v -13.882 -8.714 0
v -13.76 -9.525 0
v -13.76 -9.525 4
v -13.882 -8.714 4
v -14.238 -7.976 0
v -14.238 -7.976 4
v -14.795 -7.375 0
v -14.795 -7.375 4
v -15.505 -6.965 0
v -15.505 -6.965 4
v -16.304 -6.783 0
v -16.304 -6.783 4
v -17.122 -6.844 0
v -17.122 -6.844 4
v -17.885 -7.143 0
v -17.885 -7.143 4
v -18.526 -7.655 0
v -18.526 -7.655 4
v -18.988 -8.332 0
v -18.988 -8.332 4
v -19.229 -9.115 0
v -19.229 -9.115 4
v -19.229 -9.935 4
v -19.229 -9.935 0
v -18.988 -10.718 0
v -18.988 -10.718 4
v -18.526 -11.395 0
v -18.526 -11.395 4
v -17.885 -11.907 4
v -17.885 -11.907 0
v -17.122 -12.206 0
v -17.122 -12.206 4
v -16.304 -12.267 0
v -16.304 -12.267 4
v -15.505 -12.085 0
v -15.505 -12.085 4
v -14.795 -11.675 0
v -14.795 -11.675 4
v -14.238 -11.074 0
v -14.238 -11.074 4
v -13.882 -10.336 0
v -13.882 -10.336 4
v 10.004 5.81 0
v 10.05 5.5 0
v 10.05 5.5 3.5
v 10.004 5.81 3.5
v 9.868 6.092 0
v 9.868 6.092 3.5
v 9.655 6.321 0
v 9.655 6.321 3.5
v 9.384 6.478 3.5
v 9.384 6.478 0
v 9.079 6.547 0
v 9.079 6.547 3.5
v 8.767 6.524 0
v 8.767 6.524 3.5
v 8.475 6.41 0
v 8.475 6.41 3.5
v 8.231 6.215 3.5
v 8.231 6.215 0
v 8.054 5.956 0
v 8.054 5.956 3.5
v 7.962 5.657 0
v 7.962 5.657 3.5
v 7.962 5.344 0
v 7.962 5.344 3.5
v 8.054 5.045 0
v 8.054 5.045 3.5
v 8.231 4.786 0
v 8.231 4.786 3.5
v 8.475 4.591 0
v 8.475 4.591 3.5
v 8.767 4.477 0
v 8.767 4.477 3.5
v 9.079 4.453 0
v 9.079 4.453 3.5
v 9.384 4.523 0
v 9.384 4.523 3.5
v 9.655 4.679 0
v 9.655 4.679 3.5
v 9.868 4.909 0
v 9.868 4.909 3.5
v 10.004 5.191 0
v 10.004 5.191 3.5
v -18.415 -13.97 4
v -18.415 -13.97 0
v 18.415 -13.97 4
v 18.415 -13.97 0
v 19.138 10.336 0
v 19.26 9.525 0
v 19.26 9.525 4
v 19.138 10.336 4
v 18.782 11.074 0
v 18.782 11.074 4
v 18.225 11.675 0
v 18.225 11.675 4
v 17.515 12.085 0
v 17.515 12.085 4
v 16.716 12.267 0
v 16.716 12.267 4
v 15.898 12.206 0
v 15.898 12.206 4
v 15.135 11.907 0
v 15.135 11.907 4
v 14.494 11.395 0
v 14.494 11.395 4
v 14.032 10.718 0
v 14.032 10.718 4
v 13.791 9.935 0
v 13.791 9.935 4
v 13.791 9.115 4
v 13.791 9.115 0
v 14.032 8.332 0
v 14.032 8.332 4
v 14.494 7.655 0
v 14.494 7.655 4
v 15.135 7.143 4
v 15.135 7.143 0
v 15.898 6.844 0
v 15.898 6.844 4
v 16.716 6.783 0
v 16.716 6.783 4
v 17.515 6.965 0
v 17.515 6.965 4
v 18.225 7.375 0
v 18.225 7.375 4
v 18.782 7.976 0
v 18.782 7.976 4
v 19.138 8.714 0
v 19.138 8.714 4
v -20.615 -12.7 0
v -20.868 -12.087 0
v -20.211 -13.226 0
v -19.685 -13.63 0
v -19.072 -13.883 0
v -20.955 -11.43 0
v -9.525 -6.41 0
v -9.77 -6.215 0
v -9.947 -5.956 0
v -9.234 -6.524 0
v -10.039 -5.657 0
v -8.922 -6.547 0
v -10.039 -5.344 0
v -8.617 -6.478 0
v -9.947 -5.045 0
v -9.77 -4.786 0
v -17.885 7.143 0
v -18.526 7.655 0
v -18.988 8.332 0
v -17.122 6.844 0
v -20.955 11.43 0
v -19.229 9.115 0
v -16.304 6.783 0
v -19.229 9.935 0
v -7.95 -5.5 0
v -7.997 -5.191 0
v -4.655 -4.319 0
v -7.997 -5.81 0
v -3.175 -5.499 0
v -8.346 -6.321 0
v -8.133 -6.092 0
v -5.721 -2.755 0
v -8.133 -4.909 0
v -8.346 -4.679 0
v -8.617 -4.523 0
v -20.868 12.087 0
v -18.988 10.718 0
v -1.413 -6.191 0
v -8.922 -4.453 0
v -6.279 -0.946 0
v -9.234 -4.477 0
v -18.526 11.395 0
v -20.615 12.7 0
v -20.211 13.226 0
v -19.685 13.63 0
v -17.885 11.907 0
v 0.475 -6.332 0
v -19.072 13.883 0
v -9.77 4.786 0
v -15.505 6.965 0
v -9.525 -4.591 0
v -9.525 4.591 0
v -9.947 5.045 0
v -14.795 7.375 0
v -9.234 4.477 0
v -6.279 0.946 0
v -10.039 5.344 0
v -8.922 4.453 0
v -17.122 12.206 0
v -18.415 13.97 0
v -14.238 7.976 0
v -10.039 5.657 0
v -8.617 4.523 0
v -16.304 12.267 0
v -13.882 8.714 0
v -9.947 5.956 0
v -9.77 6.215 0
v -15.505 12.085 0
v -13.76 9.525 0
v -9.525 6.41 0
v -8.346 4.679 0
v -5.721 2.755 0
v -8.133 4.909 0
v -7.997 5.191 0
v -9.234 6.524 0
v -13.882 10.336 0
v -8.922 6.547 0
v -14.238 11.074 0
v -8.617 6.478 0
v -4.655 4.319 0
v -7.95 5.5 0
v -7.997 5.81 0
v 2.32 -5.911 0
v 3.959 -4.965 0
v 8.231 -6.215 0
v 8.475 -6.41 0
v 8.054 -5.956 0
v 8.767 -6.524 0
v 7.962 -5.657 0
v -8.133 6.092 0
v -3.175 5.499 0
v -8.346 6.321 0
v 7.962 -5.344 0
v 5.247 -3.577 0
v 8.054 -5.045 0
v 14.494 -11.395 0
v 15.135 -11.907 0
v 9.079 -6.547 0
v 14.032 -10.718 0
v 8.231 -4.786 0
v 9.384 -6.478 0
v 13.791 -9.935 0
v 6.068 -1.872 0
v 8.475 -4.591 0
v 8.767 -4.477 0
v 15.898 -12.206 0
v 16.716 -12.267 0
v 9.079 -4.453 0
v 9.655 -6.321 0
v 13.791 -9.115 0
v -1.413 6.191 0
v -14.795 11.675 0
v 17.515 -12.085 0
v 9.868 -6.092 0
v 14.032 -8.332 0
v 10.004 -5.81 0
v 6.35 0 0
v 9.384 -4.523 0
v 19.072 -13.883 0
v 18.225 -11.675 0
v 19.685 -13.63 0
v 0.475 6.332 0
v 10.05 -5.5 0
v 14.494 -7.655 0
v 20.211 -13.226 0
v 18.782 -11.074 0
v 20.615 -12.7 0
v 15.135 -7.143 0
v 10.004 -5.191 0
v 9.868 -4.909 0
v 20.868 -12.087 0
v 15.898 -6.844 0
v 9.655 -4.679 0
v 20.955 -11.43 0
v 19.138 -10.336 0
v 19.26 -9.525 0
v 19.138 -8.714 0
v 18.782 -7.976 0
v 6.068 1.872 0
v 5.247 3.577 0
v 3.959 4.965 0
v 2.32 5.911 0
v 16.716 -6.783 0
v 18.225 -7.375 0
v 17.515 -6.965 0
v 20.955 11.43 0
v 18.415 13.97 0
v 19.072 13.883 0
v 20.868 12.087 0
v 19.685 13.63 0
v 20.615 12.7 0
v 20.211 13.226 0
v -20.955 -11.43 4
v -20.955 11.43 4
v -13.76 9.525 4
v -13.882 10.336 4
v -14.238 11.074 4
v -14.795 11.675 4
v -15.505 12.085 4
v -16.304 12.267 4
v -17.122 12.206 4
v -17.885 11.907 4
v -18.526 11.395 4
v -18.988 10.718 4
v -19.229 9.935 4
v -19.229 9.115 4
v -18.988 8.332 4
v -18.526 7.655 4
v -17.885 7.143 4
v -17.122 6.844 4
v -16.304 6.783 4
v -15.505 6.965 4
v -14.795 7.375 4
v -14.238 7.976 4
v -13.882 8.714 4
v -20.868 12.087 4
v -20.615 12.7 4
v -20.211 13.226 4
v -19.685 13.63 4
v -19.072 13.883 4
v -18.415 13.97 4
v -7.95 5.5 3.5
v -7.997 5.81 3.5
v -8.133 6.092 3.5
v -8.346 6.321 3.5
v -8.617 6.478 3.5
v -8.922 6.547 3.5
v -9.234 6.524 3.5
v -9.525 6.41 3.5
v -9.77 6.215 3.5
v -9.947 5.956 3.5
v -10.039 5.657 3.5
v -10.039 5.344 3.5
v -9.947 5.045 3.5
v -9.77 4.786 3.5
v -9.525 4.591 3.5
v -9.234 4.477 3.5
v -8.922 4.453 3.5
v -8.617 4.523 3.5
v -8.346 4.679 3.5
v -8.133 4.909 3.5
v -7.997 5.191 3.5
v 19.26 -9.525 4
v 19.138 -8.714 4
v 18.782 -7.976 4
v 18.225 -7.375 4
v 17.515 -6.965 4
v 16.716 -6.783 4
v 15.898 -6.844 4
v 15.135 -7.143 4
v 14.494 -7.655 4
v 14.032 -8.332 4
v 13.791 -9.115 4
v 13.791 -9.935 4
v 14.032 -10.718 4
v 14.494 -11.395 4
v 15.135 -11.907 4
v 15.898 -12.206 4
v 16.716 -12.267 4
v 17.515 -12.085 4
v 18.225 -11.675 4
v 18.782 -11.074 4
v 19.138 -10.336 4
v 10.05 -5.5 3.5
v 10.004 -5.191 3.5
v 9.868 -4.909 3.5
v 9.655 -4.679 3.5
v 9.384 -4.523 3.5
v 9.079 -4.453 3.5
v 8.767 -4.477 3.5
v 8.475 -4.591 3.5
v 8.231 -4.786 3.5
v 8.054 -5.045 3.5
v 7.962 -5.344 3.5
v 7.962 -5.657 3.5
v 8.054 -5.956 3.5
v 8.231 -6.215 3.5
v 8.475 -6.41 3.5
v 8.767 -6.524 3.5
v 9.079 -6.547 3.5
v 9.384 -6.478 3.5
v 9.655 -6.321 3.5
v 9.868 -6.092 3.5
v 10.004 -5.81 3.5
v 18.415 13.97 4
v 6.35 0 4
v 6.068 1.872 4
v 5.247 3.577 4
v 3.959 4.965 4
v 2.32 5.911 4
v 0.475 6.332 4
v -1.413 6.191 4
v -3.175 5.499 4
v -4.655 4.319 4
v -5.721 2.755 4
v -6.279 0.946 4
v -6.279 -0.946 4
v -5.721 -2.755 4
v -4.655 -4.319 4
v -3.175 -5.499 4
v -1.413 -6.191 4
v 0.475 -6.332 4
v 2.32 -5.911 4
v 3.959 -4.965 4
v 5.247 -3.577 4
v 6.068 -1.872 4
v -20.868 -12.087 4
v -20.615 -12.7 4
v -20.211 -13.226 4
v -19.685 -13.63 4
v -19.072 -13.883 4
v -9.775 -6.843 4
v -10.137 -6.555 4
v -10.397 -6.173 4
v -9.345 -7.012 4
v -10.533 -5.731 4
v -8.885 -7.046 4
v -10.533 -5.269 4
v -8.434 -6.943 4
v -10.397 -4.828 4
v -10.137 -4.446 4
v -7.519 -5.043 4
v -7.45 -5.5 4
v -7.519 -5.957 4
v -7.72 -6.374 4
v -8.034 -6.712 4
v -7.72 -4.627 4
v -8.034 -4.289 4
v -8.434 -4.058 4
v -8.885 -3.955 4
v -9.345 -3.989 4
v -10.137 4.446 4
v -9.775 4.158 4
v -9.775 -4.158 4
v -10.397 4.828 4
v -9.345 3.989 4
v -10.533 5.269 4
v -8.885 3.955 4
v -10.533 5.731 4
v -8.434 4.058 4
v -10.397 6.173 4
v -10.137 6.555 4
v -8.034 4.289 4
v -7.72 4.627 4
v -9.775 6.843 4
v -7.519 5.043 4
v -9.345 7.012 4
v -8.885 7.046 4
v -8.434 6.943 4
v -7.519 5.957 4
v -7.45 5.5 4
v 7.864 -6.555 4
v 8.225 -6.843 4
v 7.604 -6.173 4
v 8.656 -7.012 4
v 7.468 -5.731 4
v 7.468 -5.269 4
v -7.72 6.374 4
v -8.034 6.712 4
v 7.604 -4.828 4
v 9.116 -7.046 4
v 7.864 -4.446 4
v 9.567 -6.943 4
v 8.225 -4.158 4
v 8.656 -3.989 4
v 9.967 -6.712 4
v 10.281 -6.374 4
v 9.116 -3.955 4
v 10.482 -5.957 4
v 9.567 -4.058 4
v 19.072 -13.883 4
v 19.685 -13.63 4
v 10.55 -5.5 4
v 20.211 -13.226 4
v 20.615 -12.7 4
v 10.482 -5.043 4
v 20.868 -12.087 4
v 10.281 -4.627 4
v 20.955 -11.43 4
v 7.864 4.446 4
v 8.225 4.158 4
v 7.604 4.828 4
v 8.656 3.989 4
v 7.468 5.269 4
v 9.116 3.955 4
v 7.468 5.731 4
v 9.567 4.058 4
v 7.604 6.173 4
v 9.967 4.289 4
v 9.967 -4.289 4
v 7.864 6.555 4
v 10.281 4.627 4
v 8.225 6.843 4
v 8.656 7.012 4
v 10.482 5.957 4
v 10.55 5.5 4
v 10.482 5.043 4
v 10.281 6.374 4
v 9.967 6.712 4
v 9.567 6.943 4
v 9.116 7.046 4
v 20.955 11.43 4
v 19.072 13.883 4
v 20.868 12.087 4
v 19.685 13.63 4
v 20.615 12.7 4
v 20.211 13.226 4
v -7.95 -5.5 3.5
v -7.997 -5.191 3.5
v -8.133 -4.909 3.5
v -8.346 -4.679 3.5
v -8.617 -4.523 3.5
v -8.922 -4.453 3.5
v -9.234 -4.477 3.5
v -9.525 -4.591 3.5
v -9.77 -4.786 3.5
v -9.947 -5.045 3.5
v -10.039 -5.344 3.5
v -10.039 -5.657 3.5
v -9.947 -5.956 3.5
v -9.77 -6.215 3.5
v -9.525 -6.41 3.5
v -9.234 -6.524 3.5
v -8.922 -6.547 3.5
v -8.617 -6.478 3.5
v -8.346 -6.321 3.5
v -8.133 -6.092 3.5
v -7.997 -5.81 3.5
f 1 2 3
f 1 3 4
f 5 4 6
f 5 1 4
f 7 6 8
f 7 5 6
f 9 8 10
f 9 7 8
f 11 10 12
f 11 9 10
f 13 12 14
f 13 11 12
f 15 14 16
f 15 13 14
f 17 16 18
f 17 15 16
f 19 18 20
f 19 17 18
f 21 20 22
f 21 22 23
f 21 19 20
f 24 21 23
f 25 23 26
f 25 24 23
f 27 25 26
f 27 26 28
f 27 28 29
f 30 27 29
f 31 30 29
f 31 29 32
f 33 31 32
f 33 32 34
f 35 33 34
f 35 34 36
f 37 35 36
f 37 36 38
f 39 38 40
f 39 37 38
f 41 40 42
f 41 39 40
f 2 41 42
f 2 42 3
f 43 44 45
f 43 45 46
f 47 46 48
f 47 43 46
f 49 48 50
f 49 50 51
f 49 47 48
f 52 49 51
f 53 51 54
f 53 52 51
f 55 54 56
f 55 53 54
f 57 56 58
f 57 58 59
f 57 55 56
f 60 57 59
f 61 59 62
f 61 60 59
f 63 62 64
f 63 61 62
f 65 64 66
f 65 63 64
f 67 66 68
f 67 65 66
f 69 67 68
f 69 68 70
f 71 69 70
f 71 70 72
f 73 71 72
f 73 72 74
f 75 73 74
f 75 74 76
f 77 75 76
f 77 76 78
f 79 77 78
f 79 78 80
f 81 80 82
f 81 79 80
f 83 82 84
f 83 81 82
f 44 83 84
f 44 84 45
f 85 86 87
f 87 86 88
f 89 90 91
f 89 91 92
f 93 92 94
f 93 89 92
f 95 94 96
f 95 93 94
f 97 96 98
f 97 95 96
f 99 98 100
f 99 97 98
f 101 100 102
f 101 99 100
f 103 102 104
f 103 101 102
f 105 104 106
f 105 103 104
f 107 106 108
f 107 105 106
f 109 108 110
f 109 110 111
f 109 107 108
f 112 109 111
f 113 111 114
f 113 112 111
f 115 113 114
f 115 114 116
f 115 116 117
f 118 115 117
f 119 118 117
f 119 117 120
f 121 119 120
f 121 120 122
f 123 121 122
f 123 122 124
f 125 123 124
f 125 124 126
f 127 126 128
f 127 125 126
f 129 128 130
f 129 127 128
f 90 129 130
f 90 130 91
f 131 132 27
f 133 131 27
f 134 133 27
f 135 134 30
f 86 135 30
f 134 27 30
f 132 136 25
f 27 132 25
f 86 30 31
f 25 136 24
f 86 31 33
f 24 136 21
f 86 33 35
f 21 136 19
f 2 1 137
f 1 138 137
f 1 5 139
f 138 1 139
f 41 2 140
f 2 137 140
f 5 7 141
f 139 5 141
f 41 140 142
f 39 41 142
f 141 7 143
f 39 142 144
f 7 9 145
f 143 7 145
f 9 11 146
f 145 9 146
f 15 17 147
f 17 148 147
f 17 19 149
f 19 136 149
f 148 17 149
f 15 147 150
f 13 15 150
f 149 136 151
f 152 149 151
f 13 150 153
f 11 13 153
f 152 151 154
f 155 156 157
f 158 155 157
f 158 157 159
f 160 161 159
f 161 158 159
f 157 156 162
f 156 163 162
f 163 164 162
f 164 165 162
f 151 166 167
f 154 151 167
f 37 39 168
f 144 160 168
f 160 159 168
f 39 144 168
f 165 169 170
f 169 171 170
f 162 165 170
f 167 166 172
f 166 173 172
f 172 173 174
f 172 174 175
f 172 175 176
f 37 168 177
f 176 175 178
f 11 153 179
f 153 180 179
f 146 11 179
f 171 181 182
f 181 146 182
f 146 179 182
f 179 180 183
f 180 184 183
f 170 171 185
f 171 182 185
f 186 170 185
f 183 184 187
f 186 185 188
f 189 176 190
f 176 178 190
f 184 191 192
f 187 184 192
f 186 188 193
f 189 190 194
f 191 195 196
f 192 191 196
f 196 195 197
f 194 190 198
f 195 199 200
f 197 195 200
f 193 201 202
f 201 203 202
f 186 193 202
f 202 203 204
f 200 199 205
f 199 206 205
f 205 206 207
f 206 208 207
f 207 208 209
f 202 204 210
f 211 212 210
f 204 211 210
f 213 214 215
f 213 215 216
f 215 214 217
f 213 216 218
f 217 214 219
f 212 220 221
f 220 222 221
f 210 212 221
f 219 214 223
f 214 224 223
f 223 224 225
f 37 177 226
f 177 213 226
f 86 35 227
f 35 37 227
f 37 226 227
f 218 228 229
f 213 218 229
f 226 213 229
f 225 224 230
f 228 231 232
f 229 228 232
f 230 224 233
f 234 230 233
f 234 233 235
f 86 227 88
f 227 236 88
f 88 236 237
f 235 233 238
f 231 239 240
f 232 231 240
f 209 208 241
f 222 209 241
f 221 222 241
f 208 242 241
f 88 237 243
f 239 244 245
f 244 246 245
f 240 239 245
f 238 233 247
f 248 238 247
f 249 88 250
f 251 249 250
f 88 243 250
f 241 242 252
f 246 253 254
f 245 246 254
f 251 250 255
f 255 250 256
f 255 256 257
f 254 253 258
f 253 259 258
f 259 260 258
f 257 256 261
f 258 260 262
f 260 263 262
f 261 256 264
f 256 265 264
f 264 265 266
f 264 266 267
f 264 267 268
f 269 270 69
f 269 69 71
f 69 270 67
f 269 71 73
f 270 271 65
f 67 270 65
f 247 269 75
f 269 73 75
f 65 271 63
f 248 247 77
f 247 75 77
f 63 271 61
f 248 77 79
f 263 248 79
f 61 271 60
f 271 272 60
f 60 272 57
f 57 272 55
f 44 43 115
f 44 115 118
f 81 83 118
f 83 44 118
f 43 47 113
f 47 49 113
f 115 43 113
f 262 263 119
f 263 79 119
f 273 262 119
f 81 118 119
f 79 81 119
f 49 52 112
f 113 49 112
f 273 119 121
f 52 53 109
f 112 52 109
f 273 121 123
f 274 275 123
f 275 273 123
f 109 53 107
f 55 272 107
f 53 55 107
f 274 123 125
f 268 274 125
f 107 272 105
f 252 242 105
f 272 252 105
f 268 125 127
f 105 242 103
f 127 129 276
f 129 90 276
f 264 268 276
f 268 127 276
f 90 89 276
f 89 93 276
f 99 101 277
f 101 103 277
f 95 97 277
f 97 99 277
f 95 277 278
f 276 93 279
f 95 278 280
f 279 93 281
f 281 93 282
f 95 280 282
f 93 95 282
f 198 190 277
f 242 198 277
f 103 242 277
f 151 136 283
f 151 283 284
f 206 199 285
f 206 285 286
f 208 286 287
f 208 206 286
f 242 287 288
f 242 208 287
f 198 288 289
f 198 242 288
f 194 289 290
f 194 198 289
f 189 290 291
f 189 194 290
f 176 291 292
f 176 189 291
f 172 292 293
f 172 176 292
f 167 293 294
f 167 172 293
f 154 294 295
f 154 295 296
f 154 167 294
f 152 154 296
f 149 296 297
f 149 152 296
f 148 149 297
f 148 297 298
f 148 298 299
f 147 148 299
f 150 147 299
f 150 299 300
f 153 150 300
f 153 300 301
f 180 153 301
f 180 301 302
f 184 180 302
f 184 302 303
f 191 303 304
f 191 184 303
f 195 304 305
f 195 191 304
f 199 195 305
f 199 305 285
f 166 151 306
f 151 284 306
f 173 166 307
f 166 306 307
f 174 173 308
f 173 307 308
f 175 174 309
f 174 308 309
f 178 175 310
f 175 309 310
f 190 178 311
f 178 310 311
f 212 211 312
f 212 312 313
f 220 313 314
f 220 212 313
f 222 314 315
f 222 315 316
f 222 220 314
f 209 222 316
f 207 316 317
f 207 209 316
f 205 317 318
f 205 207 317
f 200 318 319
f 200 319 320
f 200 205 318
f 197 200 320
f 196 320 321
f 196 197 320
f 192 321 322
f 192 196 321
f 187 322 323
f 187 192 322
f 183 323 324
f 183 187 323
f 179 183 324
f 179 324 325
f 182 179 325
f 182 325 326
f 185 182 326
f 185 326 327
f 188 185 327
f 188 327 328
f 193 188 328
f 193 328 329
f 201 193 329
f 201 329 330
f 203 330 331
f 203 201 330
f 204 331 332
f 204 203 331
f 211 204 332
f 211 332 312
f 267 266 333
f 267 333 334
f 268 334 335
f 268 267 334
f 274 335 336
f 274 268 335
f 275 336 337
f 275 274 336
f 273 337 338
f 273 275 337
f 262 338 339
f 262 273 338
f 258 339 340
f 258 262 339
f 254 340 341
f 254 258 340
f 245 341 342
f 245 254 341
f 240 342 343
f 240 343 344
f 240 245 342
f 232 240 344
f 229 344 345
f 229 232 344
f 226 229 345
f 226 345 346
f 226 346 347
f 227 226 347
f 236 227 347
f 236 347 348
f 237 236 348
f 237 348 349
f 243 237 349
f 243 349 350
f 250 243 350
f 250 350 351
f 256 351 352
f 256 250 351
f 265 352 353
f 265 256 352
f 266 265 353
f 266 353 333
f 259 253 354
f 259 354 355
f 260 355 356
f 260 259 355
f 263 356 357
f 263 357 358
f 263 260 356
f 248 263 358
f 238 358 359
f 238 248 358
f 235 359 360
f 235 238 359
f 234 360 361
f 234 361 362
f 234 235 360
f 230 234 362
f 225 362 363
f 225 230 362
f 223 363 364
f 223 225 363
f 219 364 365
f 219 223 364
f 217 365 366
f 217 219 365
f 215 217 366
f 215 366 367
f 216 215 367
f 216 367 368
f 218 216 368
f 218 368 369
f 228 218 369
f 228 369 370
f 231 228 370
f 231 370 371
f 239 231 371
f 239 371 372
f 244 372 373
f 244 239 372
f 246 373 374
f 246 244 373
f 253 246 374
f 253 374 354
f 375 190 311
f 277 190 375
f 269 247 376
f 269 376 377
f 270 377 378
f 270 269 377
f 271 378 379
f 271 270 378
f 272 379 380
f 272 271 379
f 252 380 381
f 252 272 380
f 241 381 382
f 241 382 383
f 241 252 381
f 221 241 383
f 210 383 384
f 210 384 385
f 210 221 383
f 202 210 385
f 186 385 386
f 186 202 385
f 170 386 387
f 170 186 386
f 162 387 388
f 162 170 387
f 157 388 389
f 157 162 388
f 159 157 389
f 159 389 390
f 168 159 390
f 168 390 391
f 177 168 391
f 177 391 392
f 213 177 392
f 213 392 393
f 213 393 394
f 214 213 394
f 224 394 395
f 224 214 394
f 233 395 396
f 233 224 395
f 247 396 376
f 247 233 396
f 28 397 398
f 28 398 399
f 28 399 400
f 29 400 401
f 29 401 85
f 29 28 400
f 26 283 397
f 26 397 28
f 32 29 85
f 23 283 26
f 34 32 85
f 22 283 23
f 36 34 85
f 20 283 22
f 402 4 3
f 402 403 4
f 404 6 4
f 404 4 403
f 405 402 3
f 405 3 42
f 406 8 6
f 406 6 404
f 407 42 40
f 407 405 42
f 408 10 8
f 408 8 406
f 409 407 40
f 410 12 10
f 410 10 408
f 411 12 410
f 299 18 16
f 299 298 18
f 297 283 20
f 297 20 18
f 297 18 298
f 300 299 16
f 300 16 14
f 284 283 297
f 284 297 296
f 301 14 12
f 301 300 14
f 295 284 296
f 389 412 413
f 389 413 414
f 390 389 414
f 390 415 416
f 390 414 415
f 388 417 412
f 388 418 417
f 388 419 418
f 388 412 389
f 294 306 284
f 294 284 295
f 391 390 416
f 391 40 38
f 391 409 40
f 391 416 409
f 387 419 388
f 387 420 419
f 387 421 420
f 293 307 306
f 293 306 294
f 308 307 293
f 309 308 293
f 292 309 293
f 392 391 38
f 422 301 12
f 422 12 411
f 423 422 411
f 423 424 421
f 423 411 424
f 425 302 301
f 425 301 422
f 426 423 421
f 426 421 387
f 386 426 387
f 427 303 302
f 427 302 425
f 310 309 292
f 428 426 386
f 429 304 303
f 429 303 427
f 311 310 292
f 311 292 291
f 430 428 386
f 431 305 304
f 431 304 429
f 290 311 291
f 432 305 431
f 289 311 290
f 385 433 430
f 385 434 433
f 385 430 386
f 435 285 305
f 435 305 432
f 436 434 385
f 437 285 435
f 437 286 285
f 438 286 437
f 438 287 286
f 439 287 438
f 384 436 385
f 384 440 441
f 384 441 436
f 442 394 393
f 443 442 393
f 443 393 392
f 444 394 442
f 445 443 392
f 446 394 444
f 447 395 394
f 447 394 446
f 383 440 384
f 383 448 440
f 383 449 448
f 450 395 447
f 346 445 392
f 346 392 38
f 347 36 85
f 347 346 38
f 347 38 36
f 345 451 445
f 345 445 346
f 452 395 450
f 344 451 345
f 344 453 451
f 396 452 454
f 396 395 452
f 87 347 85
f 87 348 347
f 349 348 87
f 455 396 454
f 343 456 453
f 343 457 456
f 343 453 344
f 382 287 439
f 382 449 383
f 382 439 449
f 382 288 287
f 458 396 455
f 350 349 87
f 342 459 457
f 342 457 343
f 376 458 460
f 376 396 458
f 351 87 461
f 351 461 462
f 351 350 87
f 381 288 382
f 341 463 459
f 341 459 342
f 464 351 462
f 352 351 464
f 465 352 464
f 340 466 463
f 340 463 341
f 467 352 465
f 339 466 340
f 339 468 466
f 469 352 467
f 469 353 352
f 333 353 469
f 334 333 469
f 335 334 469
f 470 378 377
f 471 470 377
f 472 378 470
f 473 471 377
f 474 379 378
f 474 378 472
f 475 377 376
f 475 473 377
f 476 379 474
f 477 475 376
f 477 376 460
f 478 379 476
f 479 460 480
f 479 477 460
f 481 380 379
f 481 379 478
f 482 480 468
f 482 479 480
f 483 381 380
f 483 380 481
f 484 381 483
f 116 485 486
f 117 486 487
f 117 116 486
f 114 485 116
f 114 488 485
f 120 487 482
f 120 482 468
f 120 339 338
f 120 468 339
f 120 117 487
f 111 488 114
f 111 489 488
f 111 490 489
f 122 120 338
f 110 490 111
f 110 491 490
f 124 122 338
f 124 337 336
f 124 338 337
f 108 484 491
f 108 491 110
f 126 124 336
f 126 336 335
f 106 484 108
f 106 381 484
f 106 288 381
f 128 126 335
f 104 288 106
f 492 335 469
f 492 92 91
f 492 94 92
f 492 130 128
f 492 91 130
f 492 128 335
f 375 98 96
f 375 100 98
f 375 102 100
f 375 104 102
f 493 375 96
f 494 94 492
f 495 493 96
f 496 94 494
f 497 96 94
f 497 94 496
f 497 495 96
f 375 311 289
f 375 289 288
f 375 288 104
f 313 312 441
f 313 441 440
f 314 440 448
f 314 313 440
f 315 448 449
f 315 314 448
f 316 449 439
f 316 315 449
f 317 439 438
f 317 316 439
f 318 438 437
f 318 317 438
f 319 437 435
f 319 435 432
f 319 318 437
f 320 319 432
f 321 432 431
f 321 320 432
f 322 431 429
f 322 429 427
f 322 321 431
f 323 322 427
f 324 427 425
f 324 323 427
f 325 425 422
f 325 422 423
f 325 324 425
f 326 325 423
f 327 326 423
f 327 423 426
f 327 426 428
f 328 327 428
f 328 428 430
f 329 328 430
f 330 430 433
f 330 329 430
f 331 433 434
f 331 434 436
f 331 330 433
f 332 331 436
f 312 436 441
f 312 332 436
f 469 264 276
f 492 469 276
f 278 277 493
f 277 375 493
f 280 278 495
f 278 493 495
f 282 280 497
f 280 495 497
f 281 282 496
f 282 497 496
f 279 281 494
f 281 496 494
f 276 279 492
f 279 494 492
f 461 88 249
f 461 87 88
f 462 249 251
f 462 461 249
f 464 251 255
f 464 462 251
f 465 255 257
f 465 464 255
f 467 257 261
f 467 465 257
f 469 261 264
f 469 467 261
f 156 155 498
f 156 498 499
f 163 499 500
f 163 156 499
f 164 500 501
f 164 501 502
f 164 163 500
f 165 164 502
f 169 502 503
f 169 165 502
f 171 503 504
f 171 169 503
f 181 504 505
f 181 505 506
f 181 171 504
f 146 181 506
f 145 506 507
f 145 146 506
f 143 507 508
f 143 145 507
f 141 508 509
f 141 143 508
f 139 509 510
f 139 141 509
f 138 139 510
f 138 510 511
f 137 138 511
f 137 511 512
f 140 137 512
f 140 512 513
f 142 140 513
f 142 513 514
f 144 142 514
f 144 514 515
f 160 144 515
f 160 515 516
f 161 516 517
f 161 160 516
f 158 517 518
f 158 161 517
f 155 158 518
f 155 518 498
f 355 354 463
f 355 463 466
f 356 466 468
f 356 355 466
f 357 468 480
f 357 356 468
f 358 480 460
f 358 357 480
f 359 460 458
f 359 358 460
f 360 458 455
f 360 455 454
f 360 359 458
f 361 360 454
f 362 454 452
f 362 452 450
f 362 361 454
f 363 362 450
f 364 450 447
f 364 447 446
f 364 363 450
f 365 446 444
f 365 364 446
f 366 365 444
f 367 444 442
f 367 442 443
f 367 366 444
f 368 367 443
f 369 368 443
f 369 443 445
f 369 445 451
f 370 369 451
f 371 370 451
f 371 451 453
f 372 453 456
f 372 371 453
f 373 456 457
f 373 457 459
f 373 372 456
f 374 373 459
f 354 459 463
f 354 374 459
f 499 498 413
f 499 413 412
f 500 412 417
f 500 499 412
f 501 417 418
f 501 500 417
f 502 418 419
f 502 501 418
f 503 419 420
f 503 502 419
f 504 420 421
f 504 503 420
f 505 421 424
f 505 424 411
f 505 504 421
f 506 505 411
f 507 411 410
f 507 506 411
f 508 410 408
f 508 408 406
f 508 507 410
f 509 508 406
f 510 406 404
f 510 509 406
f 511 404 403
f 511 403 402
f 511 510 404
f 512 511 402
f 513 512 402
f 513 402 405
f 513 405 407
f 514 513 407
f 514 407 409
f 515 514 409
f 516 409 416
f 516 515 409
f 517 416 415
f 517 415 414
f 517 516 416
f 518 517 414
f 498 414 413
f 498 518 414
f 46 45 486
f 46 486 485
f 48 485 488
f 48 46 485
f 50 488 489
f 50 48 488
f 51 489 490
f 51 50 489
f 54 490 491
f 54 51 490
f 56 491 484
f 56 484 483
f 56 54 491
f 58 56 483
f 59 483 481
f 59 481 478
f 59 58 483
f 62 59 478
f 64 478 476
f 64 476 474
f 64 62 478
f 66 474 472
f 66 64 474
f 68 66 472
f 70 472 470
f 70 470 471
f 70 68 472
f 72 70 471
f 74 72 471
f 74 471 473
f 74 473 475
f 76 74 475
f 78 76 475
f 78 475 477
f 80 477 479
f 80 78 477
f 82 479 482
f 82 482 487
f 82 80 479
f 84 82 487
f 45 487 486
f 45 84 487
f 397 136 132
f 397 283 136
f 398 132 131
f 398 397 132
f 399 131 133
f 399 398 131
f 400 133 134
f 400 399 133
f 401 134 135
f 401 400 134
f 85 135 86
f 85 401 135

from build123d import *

# Parameters (mm, degrees)
SKETCH1_W           = 41.91
SKETCH1_H           = 27.94
SKETCH1_R           = 2.75
SKETCH1_R_2         = 1.05
SKETCH1_R_3         = 6.35
BOSS_EXTRUDE1_DEPTH = 4
FILLET1_R           = 2.54
CHAMFER1_SIZE       = 0.5


with BuildPart() as part:
    # Sketch1 → Boss-Extrude1 (new body)
    with BuildSketch(Plane.XY):
        Rectangle(SKETCH1_W, SKETCH1_H)
        with Locations((-16.51, 9.525)):
            Circle(SKETCH1_R, mode=Mode.SUBTRACT)
        with Locations((16.51, 9.525)):
            Circle(SKETCH1_R, mode=Mode.SUBTRACT)
        with Locations((16.51, -9.525)):
            Circle(SKETCH1_R, mode=Mode.SUBTRACT)
        with Locations((-16.51, -9.525)):
            Circle(SKETCH1_R, mode=Mode.SUBTRACT)
        with Locations((-9.00049, 5.50037)):
            Circle(SKETCH1_R_2, mode=Mode.SUBTRACT)
        with Locations((9.00049, -5.50037)):
            Circle(SKETCH1_R_2, mode=Mode.SUBTRACT)
        Circle(SKETCH1_R_3, mode=Mode.SUBTRACT)
        with Locations((-9.00049, -5.50037)):
            Circle(SKETCH1_R_2, mode=Mode.SUBTRACT)
        with Locations((9.00049, 5.50037)):
            Circle(SKETCH1_R_2, mode=Mode.SUBTRACT)
    extrude(amount=BOSS_EXTRUDE1_DEPTH)

    # Fillet1
    fillet1_edges = [part.edges().sort_by_distance(p)[0] for p in [
        (-20.955, 13.97, 2),
        (20.955, 13.97, 2),
        (20.955, -13.97, 2),
        (-20.955, -13.97, 2),
    ]]
    fillet(fillet1_edges, radius=FILLET1_R)

    # Chamfer1
    chamfer1_edges = [part.edges().sort_by_distance(p)[0] for p in [
        (7.95049, -5.50037, 4),
        (-10.05049, 5.50037, 4),
        (-10.05049, -5.50037, 4),
        (7.95049, 5.50037, 4),
    ]]
    chamfer(chamfer1_edges, length=CHAMFER1_SIZE)


solid = part.part
